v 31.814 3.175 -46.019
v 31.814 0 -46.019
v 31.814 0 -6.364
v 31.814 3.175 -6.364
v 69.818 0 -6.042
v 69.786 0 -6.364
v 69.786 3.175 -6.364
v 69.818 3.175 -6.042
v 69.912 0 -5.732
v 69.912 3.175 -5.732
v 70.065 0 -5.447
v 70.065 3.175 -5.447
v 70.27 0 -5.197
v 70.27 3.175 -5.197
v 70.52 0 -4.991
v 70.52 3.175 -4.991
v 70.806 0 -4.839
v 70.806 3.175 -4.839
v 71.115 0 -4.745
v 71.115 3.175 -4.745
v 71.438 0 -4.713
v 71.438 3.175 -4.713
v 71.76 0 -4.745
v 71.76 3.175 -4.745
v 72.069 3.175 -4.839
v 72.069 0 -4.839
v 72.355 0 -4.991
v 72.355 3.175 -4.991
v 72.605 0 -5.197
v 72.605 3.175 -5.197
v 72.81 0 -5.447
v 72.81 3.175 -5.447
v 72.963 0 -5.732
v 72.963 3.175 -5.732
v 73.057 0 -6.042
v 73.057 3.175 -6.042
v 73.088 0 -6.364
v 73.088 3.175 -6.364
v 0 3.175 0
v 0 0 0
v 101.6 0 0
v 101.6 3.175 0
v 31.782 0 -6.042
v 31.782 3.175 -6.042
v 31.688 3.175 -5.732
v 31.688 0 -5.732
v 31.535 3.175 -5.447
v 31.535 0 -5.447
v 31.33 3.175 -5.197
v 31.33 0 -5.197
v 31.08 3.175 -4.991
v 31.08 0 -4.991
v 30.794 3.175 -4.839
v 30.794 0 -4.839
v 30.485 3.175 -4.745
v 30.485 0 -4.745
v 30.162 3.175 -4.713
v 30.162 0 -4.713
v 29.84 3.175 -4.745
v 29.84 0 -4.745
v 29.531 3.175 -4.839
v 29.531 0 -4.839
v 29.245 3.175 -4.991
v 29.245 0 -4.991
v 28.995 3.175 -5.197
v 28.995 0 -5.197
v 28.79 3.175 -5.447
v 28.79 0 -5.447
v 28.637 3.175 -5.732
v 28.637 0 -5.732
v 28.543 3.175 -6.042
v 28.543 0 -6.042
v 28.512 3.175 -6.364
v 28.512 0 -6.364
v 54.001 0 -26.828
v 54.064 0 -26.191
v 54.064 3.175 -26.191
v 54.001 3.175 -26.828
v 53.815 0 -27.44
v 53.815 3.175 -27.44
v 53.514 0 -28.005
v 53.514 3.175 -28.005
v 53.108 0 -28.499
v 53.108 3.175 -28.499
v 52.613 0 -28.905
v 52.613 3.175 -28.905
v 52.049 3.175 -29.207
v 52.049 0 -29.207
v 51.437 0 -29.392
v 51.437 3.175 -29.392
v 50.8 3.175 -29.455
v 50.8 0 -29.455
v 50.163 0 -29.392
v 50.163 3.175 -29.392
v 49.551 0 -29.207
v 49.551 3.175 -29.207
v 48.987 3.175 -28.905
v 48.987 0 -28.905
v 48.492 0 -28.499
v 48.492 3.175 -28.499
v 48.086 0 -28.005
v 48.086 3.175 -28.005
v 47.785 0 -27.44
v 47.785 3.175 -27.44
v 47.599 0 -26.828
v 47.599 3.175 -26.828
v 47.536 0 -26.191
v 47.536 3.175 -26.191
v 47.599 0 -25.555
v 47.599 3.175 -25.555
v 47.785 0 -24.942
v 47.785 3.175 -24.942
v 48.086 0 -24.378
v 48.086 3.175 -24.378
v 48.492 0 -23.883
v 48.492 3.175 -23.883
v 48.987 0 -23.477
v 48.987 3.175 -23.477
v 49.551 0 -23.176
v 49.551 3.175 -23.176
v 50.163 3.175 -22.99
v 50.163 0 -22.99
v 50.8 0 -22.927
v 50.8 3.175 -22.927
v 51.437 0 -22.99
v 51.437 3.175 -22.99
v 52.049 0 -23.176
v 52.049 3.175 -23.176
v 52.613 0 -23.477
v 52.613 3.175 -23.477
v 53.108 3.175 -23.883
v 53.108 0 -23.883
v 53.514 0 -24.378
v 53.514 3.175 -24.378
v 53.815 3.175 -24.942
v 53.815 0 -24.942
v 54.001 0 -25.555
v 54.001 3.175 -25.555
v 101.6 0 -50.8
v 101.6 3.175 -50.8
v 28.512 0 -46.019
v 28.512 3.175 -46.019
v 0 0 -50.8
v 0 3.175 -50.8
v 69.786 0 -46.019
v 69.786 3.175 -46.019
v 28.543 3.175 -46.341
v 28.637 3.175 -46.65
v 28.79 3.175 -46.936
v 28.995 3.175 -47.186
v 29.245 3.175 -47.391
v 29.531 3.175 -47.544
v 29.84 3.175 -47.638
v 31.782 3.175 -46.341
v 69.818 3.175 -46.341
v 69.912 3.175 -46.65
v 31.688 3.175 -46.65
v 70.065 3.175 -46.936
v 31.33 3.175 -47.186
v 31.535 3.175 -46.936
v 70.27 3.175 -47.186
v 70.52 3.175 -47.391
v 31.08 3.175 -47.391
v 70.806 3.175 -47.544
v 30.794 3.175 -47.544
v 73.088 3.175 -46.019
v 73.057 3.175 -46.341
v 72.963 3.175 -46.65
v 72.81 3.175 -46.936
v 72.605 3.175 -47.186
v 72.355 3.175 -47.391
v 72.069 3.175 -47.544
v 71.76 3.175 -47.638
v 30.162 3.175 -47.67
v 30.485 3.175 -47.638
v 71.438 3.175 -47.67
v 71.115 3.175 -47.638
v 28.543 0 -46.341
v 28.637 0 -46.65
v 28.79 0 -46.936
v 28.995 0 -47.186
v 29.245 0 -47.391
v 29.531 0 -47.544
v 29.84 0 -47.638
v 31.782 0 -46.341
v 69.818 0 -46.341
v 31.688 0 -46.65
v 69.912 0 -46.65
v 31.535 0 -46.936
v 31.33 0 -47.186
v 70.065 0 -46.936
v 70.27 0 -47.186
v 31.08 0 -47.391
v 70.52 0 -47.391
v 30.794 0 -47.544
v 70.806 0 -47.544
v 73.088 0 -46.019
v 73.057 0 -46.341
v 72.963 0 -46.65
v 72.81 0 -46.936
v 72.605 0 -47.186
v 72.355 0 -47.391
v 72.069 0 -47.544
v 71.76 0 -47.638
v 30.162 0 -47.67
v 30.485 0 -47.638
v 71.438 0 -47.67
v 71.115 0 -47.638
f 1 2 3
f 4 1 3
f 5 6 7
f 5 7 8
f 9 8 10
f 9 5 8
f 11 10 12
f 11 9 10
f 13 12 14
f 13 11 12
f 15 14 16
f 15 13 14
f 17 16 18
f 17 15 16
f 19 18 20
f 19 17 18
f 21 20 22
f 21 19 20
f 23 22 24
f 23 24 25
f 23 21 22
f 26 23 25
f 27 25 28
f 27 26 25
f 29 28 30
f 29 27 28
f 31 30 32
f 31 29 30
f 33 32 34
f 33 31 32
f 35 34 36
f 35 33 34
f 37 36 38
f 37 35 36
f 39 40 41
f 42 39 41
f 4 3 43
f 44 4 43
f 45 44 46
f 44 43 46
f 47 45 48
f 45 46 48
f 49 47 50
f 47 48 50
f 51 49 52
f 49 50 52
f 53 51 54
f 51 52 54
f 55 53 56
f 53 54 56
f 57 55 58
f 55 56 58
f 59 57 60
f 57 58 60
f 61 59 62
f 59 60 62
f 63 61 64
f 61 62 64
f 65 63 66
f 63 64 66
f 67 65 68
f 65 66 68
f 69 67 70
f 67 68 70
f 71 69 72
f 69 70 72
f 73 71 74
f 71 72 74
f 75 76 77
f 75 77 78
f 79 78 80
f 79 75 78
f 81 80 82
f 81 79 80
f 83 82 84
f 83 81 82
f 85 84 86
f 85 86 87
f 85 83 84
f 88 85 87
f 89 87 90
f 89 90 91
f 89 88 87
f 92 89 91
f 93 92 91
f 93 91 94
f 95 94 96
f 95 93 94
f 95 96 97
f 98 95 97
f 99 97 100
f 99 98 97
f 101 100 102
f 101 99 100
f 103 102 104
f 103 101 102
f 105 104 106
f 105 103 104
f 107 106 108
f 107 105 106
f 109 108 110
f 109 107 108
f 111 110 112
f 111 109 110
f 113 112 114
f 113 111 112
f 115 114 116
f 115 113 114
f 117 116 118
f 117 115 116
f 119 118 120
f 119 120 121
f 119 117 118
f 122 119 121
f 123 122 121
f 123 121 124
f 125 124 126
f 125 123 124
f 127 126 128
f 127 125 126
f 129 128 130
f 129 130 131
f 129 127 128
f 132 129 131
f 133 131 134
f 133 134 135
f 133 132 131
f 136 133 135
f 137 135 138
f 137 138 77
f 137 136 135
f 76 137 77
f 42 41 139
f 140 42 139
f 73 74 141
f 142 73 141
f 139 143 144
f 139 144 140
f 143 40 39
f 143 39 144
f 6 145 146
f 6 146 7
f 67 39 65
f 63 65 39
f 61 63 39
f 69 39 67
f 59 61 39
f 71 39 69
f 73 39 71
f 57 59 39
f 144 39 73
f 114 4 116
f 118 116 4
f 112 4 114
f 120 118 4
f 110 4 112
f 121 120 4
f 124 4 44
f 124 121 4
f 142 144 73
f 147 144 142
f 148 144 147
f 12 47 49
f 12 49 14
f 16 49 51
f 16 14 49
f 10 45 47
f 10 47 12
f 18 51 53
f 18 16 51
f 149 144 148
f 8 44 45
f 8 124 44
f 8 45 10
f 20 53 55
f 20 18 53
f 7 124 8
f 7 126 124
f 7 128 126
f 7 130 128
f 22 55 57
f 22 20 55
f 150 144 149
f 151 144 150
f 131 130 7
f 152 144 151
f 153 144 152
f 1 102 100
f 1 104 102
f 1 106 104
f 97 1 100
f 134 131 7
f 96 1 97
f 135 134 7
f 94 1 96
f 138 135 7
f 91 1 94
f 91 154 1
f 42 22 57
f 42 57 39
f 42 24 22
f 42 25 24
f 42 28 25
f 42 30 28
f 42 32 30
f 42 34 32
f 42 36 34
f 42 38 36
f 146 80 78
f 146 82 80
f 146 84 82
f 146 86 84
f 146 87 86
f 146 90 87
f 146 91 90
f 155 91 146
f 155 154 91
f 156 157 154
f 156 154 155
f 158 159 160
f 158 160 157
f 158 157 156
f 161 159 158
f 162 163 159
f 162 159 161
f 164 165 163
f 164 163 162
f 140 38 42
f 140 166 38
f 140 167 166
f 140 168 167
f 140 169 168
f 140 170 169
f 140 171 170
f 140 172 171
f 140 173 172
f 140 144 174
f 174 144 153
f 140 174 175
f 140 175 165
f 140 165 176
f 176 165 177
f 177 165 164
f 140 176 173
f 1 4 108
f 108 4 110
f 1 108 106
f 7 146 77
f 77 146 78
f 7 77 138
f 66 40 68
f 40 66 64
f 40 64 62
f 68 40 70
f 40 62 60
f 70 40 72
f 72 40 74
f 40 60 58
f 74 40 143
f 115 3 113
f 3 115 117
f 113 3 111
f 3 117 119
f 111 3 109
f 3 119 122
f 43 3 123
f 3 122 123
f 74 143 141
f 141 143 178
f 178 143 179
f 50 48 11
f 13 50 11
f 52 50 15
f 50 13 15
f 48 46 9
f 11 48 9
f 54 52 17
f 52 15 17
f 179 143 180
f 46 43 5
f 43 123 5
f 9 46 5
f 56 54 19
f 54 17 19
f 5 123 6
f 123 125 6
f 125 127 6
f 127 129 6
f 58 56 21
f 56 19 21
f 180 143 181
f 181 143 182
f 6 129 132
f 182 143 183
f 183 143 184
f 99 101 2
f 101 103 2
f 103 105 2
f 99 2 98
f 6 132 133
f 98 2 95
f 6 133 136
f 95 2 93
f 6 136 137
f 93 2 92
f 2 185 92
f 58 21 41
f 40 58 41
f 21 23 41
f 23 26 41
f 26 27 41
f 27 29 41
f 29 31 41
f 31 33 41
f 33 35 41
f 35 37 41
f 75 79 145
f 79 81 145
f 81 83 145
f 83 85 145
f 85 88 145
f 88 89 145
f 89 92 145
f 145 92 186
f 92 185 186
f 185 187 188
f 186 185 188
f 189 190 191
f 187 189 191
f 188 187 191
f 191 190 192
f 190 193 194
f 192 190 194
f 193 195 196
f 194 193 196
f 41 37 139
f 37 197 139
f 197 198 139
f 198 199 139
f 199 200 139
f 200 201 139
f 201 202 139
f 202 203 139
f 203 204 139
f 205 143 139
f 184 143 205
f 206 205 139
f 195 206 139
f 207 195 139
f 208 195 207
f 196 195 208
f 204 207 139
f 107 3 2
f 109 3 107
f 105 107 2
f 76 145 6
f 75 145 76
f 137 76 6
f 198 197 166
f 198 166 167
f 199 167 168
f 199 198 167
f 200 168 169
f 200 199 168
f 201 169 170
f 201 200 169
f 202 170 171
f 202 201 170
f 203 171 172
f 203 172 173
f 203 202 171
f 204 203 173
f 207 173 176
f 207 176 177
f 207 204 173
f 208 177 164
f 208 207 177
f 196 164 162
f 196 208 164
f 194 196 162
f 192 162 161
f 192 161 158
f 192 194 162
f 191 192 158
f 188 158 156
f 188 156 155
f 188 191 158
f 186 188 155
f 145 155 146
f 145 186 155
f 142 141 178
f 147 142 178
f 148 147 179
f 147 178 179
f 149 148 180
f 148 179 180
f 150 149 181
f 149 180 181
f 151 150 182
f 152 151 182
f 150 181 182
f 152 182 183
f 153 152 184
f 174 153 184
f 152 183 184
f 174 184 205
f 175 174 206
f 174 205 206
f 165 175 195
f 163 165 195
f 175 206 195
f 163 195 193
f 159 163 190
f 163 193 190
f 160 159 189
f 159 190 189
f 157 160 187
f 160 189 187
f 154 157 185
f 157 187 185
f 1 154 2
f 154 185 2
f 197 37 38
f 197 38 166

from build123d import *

# Parameters (mm, degrees)
SKETCH2_W           = 101.6
SKETCH2_H           = 50.8
SKETCH2_R           = 3.2639
BOSS_EXTRUDE1_DEPTH = 3.175


with BuildPart() as part:
    # Sketch2 → Boss-Extrude1 (new body)
    with BuildSketch(Plane(origin=(0, 0, 0), x_dir=(1, 0, 0), z_dir=(0, 1, 0))):
        with Locations((50.8, 25.4)):
            Rectangle(SKETCH2_W, SKETCH2_H)
        with Locations((50.8, 26.191302461)):
            Circle(SKETCH2_R, mode=Mode.SUBTRACT)
        with BuildLine():
            Line((28.5115, 6.363982324), (28.5115, 46.018622597))
            ThreePointArc((28.5115, 46.018622597), (30.1625, 47.669622597), (31.8135, 46.018622597))
            Line((31.8135, 46.018622597), (31.8135, 6.363982324))
            ThreePointArc((31.8135, 6.363982324), (30.1625, 4.712982324), (28.5115, 6.363982324))
        make_face(mode=Mode.SUBTRACT)
        with BuildLine():
            Line((73.0885, 6.363982324), (73.0885, 46.018622597))
            ThreePointArc((73.0885, 46.018622597), (71.4375, 47.669622597), (69.7865, 46.018622597))
            Line((69.7865, 46.018622597), (69.7865, 6.363982324))
            ThreePointArc((69.7865, 6.363982324), (71.4375, 4.712982324), (73.0885, 6.363982324))
        make_face(mode=Mode.SUBTRACT)
    extrude(amount=BOSS_EXTRUDE1_DEPTH)


solid = part.part
